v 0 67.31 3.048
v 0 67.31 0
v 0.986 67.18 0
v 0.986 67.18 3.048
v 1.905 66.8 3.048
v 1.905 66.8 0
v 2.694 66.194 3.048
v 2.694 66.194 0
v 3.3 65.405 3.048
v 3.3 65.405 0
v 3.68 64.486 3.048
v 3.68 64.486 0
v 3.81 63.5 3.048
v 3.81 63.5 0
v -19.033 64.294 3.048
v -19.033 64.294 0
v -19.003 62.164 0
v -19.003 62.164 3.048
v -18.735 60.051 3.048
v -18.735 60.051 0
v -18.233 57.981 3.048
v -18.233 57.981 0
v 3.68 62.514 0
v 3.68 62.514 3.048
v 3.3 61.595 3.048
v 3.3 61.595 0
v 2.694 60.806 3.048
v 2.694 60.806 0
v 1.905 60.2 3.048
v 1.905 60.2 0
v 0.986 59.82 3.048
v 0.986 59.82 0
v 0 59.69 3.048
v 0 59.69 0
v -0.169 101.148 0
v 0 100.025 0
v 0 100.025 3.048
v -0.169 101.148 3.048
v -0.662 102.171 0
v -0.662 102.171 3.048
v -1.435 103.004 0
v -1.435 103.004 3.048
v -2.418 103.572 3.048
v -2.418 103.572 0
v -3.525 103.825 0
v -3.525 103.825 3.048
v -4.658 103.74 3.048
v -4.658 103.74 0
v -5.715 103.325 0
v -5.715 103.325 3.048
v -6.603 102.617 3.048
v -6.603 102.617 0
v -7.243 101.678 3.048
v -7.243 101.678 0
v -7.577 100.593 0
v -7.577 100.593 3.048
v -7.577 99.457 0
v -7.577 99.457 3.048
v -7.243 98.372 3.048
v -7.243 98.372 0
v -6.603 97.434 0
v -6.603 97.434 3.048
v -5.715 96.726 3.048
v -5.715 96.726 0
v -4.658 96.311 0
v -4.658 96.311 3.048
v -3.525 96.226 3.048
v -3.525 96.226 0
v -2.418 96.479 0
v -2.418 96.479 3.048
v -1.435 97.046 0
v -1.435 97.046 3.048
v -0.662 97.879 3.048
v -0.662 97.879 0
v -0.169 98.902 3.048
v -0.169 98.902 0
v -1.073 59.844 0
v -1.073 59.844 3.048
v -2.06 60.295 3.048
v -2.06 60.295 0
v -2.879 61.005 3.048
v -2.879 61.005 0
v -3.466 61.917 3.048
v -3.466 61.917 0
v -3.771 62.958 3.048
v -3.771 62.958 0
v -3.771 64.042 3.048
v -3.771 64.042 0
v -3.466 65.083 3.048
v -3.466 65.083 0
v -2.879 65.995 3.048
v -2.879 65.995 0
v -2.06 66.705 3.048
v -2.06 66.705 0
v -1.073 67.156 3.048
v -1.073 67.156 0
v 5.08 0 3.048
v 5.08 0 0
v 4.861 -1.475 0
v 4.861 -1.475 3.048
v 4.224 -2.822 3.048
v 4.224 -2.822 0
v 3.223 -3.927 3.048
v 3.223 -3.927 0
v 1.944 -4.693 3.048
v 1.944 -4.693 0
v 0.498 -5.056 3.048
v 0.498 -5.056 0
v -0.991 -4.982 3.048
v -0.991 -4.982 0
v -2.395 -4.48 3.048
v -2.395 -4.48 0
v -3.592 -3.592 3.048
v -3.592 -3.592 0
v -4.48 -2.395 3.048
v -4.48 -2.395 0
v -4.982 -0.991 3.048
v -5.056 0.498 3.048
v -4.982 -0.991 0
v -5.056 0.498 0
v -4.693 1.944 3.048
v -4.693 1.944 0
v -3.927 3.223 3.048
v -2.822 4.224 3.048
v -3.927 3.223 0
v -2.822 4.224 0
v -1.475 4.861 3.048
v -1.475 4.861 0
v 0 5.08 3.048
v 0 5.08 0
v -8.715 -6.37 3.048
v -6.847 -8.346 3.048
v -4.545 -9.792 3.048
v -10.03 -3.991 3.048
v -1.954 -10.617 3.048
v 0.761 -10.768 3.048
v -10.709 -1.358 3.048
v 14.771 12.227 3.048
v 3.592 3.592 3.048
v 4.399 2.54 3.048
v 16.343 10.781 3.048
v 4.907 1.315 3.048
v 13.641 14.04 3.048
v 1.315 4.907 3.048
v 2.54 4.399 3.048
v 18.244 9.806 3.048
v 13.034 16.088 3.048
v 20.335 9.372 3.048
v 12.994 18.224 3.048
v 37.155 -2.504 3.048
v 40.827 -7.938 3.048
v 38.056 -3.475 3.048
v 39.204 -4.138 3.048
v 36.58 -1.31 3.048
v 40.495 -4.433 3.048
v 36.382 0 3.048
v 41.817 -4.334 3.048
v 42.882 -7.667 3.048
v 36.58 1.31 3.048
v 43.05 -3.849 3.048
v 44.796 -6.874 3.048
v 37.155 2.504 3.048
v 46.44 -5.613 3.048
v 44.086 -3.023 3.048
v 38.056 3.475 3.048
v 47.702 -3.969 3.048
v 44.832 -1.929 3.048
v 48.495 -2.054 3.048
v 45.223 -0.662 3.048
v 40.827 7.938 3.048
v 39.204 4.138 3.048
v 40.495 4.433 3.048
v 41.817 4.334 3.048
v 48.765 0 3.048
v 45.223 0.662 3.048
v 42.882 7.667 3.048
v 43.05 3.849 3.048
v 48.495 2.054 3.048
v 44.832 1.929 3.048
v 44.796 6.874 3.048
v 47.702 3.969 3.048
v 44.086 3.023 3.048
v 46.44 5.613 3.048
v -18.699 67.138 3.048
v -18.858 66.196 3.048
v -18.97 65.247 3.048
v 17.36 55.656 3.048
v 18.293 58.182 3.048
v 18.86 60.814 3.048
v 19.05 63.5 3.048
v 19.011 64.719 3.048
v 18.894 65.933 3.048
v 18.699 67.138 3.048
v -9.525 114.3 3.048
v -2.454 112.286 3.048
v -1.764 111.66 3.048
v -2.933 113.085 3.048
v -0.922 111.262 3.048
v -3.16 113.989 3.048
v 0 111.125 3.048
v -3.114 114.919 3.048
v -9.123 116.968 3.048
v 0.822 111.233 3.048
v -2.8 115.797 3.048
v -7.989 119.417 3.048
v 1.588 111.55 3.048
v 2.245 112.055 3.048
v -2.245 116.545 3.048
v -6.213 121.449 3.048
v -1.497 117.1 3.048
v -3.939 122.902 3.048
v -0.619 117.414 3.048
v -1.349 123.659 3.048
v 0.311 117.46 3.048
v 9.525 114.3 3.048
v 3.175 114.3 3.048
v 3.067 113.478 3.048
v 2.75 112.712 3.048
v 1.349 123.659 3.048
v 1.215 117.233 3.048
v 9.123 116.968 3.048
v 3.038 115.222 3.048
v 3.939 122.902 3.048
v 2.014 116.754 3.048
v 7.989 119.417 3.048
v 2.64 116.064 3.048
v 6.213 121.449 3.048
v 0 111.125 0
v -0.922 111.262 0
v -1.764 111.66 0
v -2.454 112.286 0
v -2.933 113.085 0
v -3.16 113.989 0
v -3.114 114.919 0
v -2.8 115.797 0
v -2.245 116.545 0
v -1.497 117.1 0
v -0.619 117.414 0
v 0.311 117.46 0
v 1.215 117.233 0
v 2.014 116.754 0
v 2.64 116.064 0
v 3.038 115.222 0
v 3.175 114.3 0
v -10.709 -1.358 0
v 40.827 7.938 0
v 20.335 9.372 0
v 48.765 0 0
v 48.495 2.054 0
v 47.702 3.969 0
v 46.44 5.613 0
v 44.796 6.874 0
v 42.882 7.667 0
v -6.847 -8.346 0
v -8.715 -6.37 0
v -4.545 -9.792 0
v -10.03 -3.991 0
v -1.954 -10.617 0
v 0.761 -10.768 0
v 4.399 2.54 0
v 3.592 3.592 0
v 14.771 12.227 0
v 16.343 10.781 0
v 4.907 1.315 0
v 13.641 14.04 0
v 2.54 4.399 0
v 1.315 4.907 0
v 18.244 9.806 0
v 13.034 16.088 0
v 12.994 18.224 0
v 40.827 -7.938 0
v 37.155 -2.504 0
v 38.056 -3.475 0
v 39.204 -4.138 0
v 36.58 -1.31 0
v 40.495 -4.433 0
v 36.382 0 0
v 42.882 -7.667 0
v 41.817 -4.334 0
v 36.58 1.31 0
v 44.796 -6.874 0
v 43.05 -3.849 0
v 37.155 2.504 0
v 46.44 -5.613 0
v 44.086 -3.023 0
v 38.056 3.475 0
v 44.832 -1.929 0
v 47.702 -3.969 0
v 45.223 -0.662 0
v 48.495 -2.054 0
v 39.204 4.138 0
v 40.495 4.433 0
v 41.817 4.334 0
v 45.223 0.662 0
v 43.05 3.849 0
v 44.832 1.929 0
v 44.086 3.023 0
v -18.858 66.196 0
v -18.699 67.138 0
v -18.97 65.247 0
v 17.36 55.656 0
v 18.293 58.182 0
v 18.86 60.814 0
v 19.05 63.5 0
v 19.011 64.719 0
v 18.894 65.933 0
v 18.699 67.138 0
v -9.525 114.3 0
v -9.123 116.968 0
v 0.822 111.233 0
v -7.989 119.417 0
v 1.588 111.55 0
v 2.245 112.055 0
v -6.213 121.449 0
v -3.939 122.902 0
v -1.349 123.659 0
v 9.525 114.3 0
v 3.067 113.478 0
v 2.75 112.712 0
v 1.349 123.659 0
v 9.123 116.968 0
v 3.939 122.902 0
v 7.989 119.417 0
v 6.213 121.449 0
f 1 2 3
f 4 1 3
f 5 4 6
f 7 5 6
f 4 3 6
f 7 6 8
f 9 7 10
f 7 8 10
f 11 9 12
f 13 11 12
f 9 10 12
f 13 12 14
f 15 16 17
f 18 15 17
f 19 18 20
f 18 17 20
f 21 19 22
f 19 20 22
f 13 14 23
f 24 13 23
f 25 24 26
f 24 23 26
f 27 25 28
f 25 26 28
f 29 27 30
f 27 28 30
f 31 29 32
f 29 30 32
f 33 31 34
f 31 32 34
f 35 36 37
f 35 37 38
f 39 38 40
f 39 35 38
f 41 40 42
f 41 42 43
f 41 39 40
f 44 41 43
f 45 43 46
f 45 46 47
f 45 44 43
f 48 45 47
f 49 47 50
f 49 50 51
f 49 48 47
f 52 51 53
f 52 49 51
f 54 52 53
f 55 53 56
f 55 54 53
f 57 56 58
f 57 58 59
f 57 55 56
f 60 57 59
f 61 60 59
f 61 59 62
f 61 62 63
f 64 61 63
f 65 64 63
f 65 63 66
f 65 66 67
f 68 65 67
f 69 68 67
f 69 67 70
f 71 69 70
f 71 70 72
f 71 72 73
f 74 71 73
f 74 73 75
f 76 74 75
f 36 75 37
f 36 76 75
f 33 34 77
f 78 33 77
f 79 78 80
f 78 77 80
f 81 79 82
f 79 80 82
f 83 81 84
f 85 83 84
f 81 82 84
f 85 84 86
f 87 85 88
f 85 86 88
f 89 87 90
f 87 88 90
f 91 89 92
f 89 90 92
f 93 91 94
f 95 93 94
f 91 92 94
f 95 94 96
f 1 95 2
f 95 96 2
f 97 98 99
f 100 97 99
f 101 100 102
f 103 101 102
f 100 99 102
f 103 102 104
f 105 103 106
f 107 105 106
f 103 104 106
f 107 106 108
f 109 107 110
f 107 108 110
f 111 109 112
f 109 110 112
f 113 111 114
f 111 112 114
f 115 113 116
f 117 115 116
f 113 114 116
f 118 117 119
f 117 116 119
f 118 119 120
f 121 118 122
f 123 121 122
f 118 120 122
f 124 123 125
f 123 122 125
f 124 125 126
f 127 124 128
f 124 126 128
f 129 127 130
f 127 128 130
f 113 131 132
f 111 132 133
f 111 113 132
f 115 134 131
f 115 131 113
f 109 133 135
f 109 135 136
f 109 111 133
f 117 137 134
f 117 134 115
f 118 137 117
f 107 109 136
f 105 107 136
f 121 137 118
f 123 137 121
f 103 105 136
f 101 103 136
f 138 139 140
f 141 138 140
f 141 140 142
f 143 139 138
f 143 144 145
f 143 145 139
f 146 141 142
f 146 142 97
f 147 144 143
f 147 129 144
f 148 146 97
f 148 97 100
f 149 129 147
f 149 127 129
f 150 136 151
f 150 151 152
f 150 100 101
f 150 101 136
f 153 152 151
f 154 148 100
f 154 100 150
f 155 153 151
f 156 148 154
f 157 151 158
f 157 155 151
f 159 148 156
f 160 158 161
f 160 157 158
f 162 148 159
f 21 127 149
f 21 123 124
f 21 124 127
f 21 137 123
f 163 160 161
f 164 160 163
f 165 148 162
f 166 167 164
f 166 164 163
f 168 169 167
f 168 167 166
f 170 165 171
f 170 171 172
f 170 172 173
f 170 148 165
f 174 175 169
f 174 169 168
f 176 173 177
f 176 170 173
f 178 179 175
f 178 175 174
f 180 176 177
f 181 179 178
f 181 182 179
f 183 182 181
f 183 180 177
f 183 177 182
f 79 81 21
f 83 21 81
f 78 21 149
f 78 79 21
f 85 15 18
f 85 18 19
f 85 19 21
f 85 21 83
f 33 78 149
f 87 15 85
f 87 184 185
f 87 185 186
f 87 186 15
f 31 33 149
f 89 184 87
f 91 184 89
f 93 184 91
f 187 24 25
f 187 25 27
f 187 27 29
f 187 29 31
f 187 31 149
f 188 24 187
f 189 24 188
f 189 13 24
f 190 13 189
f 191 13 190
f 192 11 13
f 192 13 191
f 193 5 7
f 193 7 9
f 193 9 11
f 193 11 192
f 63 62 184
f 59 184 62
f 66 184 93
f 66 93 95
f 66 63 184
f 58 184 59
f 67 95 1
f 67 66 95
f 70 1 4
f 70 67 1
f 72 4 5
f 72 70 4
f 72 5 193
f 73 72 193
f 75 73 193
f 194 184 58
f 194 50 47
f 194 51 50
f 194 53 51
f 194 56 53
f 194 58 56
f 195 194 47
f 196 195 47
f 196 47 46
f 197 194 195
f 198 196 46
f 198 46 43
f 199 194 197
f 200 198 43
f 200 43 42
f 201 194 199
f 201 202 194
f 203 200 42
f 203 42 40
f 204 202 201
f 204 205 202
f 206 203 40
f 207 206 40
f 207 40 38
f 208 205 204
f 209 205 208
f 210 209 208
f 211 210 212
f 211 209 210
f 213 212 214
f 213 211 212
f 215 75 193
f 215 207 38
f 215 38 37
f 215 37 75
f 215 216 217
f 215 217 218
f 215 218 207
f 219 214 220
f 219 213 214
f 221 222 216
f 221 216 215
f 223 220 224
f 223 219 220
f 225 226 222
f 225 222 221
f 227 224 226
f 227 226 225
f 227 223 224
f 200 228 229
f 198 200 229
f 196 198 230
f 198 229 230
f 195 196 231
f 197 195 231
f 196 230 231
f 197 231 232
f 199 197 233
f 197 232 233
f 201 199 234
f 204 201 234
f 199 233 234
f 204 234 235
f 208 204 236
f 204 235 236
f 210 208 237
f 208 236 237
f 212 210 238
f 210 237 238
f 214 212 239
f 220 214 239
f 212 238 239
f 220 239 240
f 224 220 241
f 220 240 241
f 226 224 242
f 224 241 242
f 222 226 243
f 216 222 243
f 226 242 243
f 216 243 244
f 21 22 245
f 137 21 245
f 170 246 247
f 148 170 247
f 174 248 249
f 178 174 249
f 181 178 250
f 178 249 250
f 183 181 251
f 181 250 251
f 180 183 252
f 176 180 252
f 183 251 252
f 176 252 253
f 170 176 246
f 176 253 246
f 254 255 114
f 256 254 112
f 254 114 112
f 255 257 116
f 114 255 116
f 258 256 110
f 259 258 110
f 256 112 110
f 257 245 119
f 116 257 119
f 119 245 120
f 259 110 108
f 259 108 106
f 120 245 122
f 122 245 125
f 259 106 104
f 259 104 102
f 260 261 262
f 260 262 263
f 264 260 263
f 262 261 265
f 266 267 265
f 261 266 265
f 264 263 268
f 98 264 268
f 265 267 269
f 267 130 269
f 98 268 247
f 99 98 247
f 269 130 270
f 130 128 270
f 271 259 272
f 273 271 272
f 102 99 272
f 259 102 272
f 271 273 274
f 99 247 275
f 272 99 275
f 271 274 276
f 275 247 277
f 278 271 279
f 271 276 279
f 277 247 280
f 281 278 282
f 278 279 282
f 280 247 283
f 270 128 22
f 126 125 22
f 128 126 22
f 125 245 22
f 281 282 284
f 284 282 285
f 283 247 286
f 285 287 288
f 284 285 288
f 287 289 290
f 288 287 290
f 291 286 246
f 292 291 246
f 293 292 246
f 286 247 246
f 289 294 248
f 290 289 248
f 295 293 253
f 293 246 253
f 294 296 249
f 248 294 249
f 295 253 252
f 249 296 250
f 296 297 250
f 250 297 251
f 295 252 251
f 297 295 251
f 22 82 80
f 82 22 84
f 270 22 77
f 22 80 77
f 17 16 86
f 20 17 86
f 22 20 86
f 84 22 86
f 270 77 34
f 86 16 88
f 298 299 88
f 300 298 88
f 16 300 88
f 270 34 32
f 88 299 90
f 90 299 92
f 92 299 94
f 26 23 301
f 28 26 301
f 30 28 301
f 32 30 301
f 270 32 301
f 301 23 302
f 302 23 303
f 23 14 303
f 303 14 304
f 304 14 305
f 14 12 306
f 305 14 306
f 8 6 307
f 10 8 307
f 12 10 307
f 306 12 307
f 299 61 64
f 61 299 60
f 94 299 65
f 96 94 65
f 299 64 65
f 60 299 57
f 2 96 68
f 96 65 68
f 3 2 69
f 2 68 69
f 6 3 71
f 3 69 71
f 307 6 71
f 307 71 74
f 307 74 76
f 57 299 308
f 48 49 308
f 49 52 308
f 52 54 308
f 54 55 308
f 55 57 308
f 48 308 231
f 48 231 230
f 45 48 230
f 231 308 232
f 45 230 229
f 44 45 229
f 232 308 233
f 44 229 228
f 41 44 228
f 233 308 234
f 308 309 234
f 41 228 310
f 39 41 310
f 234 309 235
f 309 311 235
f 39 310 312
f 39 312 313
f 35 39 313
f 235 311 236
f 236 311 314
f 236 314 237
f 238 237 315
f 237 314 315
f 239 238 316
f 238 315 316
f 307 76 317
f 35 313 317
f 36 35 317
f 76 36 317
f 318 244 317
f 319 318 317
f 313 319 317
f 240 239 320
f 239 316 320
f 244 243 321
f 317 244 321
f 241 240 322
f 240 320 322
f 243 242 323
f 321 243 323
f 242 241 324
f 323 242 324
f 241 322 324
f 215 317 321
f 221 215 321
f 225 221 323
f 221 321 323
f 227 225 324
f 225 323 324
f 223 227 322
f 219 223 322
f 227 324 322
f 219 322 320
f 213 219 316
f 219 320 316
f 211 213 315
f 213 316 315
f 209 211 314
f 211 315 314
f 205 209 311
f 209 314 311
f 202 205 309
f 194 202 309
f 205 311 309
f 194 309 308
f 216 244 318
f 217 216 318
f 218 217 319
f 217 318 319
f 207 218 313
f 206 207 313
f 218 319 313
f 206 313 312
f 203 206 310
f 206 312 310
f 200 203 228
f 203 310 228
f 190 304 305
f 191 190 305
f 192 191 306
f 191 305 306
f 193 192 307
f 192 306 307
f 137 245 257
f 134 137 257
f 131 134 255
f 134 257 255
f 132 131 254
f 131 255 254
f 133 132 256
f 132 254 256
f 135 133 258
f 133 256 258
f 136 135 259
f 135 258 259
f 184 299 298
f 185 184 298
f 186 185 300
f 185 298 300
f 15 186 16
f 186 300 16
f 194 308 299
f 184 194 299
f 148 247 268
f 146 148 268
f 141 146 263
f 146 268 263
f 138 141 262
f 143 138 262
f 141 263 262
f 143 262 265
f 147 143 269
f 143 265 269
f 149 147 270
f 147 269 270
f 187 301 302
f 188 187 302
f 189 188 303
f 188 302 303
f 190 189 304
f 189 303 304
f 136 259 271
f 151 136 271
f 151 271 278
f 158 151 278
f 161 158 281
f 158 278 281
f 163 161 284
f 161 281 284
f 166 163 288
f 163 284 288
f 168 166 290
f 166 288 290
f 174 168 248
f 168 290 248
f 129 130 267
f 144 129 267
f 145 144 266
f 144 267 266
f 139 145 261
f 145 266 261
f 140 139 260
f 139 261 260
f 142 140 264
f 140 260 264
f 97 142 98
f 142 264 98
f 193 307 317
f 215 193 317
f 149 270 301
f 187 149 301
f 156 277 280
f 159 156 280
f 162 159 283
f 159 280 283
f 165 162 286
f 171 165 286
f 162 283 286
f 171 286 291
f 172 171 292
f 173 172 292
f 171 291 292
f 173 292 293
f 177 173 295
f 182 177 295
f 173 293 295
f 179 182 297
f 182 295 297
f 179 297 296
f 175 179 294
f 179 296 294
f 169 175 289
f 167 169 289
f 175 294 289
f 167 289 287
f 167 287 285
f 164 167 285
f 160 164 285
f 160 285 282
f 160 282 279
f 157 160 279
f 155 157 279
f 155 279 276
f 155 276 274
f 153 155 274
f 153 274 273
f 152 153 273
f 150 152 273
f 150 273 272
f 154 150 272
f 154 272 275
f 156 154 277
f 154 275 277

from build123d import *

# Parameters (mm, degrees)
F0_R     = 3.81
F1_DEPTH = 3.048
F2_DEPTH = 3.048


with BuildPart() as f1:
    # F0 (on Top) → F1 (new body)
    with BuildSketch(Plane.XY):
        with BuildLine():
            ThreePointArc((5.08, 0), (-3.5921024484, -3.5921024484), (0, 5.08))
            Line((0, 5.08), (0, 10.795))
            ThreePointArc((0, 10.795), (-8.0990763391, 7.1370153042), (-10.7092601728, -1.3578554974))
            ThreePointArc((-10.7092601728, -1.3578554974), (-6.8470170962, -8.3456804327), (0.760755928, -10.7681602615))
            ThreePointArc((0.760755928, -10.7681602615), (7.8976067654, -7.3593364088), (10.795, 0))
            Line((10.795, 0), (5.08, 0))
        make_face()
        with BuildLine():
            ThreePointArc((-10.7092601728, -1.3578554974), (-8.0990763391, 7.1370153042), (0, 10.795))
            Line((0, 10.795), (0, 44.45))
            ThreePointArc((0, 44.45), (-11.3525779785, 48.2022396005), (-18.2329677514, 57.9808164576))
            Line((-18.2329677514, 57.9808164576), (-10.7092601728, -1.3578554974))
        make_face()
        with BuildLine():
            Line((0, 44.45), (0, 10.795))
            ThreePointArc((0, 10.795), (7.6332177029, 7.6332177029), (10.795, 0))
            Line((10.795, 0), (32.8899903893, 0))
            ThreePointArc((32.8899903893, 0), (35.2148303137, 5.6126600757), (40.8274903893, 7.9375))
            Line((40.8274903893, 7.9375), (20.335469936, 9.3717284546))
            ThreePointArc((20.335469936, 9.3717284546), (14.7711479184, 12.2272266722), (12.9938829963, 18.2236321774))
            Line((12.9938829963, 18.2236321774), (17.3601908133, 55.65613138))
            ThreePointArc((17.3601908133, 55.65613138), (10.3314278488, 47.4948727401), (0, 44.45))
        make_face()
        with BuildLine():
            Line((32.8899903893, 0), (10.795, 0))
            ThreePointArc((10.795, 0), (7.8976067654, -7.3593364088), (0.760755928, -10.7681602615))
            Line((0.760755928, -10.7681602615), (40.8274903893, -7.9375))
            ThreePointArc((40.8274903893, -7.9375), (35.2148303137, -5.6126600757), (32.8899903893, 0))
        make_face()
        with BuildLine():
            ThreePointArc((-18.2329677514, 57.9808164576), (-11.3525779785, 48.2022396005), (0, 44.45))
            Line((0, 44.45), (0, 59.69))
            ThreePointArc((0, 59.69), (-3.81, 63.5), (0, 67.31))
            Line((0, 67.31), (0, 82.55))
            ThreePointArc((0, 82.55), (-12.1161952262, 78.2003507863), (-18.6994561701, 67.1376969281))
            ThreePointArc((-18.6994561701, 67.1376969281), (-18.9199487116, 65.7221702793), (-19.0334427381, 64.2940765289))
            Line((-19.0334427381, 64.2940765289), (-18.2329677514, 57.9808164576))
        make_face()
        with BuildLine():
            Line((0, 59.69), (0, 44.45))
            ThreePointArc((0, 44.45), (10.3314278488, 47.4948727401), (17.3601908133, 55.65613138))
            Line((17.3601908133, 55.65613138), (18.6994561701, 67.1376969281))
            ThreePointArc((18.6994561701, 67.1376969281), (12.1161952262, 78.2003507863), (0, 82.55))
            Line((0, 82.55), (0, 67.31))
            ThreePointArc((0, 67.31), (2.6940768363, 66.1940768363), (3.81, 63.5))
            ThreePointArc((3.81, 63.5), (2.6940768363, 60.8059231637), (0, 59.69))
        make_face()
        with BuildLine():
            ThreePointArc((40.8274903893, 7.9375), (35.2148303137, 5.6126600757), (32.8899903893, 0))
            ThreePointArc((32.8899903893, 0), (35.2148303137, -5.6126600757), (40.8274903893, -7.9375))
            ThreePointArc((40.8274903893, -7.9375), (46.440150465, -5.6126600757), (48.7649903893, 0))
            ThreePointArc((48.7649903893, 0), (46.440150465, 5.6126600757), (40.8274903893, 7.9375))
        make_face()
        with BuildLine():
            ThreePointArc((45.2724903893, 0), (40.8274903893, -4.445), (36.3824903893, 0))
            ThreePointArc((36.3824903893, 0), (40.8274903893, 4.445), (45.2724903893, 0))
        make_face(mode=Mode.SUBTRACT)
        with BuildLine():
            ThreePointArc((-19.0334427381, 64.2940765289), (-18.8986944225, 61.1037844163), (-18.2329677514, 57.9808164576))
            Line((-18.2329677514, 57.9808164576), (-19.0334427381, 64.2940765289))
        make_face()
        with BuildLine():
            Line((18.6994561701, 67.1376969281), (17.3601908133, 55.65613138))
            ThreePointArc((17.3601908133, 55.65613138), (18.6227567104, 59.488088672), (19.05, 63.5))
            ThreePointArc((19.05, 63.5), (18.9621615334, 65.3272739202), (18.6994561701, 67.1376969281))
        make_face()
        with BuildLine():
            ThreePointArc((0, 82.55), (12.1161952262, 78.2003507863), (18.6994561701, 67.1376969281))
            Line((18.6994561701, 67.1376969281), (9.5247420262, 114.3))
            ThreePointArc((9.5247420262, 114.3), (9.5249355063, 114.2649490813), (9.525, 114.2298976878))
            ThreePointArc((9.525, 114.2298976878), (6.7351920908, 107.494705597), (0, 104.7048976878))
            Line((0, 104.7048976878), (0, 100.0252))
            Line((0, 100.0252), (0, 82.55))
        make_face()
        with BuildLine():
            ThreePointArc((-18.6994561701, 67.1376969281), (-12.1161952262, 78.2003507863), (0, 82.55))
            Line((0, 82.55), (0, 100.0252))
            Line((0, 100.0252), (0, 104.7048976878))
            ThreePointArc((0, 104.7048976878), (-6.7599315649, 107.5195362789), (-9.5247420262, 114.3))
            Line((-9.5247420262, 114.3), (-18.6994561701, 67.1376969281))
        make_face()
        with Locations((-3.81, 100.0252)):
            Circle(F0_R, mode=Mode.SUBTRACT)
        with BuildLine():
            ThreePointArc((9.525, 114.2298976878), (9.5249355063, 114.2649490813), (9.5247420262, 114.3))
            ThreePointArc((9.5247420262, 114.3), (0, 123.7548976878), (-9.5247420262, 114.3))
            ThreePointArc((-9.5247420262, 114.3), (-6.7599315649, 107.5195362789), (0, 104.7048976878))
            ThreePointArc((0, 104.7048976878), (6.7351920908, 107.494705597), (9.525, 114.2298976878))
        make_face()
        with BuildLine():
            ThreePointArc((3.175, 114.3), (2.2450640303, 112.0549359697), (0, 111.125))
            ThreePointArc((0, 111.125), (-2.2450640303, 116.5450640303), (3.175, 114.3))
        make_face(mode=Mode.SUBTRACT)
    extrude(amount=F1_DEPTH)

    # F0 (on Top) → F2 (join)
    with BuildSketch(Plane.XY):
        with BuildLine():
            Line((0, 10.795), (0, 5.08))
            ThreePointArc((0, 5.08), (3.5921024484, 3.5921024484), (5.08, 0))
            Line((5.08, 0), (10.795, 0))
            ThreePointArc((10.795, 0), (7.6332177029, 7.6332177029), (0, 10.795))
        make_face()
    extrude(amount=F2_DEPTH)


solid = f1.part
